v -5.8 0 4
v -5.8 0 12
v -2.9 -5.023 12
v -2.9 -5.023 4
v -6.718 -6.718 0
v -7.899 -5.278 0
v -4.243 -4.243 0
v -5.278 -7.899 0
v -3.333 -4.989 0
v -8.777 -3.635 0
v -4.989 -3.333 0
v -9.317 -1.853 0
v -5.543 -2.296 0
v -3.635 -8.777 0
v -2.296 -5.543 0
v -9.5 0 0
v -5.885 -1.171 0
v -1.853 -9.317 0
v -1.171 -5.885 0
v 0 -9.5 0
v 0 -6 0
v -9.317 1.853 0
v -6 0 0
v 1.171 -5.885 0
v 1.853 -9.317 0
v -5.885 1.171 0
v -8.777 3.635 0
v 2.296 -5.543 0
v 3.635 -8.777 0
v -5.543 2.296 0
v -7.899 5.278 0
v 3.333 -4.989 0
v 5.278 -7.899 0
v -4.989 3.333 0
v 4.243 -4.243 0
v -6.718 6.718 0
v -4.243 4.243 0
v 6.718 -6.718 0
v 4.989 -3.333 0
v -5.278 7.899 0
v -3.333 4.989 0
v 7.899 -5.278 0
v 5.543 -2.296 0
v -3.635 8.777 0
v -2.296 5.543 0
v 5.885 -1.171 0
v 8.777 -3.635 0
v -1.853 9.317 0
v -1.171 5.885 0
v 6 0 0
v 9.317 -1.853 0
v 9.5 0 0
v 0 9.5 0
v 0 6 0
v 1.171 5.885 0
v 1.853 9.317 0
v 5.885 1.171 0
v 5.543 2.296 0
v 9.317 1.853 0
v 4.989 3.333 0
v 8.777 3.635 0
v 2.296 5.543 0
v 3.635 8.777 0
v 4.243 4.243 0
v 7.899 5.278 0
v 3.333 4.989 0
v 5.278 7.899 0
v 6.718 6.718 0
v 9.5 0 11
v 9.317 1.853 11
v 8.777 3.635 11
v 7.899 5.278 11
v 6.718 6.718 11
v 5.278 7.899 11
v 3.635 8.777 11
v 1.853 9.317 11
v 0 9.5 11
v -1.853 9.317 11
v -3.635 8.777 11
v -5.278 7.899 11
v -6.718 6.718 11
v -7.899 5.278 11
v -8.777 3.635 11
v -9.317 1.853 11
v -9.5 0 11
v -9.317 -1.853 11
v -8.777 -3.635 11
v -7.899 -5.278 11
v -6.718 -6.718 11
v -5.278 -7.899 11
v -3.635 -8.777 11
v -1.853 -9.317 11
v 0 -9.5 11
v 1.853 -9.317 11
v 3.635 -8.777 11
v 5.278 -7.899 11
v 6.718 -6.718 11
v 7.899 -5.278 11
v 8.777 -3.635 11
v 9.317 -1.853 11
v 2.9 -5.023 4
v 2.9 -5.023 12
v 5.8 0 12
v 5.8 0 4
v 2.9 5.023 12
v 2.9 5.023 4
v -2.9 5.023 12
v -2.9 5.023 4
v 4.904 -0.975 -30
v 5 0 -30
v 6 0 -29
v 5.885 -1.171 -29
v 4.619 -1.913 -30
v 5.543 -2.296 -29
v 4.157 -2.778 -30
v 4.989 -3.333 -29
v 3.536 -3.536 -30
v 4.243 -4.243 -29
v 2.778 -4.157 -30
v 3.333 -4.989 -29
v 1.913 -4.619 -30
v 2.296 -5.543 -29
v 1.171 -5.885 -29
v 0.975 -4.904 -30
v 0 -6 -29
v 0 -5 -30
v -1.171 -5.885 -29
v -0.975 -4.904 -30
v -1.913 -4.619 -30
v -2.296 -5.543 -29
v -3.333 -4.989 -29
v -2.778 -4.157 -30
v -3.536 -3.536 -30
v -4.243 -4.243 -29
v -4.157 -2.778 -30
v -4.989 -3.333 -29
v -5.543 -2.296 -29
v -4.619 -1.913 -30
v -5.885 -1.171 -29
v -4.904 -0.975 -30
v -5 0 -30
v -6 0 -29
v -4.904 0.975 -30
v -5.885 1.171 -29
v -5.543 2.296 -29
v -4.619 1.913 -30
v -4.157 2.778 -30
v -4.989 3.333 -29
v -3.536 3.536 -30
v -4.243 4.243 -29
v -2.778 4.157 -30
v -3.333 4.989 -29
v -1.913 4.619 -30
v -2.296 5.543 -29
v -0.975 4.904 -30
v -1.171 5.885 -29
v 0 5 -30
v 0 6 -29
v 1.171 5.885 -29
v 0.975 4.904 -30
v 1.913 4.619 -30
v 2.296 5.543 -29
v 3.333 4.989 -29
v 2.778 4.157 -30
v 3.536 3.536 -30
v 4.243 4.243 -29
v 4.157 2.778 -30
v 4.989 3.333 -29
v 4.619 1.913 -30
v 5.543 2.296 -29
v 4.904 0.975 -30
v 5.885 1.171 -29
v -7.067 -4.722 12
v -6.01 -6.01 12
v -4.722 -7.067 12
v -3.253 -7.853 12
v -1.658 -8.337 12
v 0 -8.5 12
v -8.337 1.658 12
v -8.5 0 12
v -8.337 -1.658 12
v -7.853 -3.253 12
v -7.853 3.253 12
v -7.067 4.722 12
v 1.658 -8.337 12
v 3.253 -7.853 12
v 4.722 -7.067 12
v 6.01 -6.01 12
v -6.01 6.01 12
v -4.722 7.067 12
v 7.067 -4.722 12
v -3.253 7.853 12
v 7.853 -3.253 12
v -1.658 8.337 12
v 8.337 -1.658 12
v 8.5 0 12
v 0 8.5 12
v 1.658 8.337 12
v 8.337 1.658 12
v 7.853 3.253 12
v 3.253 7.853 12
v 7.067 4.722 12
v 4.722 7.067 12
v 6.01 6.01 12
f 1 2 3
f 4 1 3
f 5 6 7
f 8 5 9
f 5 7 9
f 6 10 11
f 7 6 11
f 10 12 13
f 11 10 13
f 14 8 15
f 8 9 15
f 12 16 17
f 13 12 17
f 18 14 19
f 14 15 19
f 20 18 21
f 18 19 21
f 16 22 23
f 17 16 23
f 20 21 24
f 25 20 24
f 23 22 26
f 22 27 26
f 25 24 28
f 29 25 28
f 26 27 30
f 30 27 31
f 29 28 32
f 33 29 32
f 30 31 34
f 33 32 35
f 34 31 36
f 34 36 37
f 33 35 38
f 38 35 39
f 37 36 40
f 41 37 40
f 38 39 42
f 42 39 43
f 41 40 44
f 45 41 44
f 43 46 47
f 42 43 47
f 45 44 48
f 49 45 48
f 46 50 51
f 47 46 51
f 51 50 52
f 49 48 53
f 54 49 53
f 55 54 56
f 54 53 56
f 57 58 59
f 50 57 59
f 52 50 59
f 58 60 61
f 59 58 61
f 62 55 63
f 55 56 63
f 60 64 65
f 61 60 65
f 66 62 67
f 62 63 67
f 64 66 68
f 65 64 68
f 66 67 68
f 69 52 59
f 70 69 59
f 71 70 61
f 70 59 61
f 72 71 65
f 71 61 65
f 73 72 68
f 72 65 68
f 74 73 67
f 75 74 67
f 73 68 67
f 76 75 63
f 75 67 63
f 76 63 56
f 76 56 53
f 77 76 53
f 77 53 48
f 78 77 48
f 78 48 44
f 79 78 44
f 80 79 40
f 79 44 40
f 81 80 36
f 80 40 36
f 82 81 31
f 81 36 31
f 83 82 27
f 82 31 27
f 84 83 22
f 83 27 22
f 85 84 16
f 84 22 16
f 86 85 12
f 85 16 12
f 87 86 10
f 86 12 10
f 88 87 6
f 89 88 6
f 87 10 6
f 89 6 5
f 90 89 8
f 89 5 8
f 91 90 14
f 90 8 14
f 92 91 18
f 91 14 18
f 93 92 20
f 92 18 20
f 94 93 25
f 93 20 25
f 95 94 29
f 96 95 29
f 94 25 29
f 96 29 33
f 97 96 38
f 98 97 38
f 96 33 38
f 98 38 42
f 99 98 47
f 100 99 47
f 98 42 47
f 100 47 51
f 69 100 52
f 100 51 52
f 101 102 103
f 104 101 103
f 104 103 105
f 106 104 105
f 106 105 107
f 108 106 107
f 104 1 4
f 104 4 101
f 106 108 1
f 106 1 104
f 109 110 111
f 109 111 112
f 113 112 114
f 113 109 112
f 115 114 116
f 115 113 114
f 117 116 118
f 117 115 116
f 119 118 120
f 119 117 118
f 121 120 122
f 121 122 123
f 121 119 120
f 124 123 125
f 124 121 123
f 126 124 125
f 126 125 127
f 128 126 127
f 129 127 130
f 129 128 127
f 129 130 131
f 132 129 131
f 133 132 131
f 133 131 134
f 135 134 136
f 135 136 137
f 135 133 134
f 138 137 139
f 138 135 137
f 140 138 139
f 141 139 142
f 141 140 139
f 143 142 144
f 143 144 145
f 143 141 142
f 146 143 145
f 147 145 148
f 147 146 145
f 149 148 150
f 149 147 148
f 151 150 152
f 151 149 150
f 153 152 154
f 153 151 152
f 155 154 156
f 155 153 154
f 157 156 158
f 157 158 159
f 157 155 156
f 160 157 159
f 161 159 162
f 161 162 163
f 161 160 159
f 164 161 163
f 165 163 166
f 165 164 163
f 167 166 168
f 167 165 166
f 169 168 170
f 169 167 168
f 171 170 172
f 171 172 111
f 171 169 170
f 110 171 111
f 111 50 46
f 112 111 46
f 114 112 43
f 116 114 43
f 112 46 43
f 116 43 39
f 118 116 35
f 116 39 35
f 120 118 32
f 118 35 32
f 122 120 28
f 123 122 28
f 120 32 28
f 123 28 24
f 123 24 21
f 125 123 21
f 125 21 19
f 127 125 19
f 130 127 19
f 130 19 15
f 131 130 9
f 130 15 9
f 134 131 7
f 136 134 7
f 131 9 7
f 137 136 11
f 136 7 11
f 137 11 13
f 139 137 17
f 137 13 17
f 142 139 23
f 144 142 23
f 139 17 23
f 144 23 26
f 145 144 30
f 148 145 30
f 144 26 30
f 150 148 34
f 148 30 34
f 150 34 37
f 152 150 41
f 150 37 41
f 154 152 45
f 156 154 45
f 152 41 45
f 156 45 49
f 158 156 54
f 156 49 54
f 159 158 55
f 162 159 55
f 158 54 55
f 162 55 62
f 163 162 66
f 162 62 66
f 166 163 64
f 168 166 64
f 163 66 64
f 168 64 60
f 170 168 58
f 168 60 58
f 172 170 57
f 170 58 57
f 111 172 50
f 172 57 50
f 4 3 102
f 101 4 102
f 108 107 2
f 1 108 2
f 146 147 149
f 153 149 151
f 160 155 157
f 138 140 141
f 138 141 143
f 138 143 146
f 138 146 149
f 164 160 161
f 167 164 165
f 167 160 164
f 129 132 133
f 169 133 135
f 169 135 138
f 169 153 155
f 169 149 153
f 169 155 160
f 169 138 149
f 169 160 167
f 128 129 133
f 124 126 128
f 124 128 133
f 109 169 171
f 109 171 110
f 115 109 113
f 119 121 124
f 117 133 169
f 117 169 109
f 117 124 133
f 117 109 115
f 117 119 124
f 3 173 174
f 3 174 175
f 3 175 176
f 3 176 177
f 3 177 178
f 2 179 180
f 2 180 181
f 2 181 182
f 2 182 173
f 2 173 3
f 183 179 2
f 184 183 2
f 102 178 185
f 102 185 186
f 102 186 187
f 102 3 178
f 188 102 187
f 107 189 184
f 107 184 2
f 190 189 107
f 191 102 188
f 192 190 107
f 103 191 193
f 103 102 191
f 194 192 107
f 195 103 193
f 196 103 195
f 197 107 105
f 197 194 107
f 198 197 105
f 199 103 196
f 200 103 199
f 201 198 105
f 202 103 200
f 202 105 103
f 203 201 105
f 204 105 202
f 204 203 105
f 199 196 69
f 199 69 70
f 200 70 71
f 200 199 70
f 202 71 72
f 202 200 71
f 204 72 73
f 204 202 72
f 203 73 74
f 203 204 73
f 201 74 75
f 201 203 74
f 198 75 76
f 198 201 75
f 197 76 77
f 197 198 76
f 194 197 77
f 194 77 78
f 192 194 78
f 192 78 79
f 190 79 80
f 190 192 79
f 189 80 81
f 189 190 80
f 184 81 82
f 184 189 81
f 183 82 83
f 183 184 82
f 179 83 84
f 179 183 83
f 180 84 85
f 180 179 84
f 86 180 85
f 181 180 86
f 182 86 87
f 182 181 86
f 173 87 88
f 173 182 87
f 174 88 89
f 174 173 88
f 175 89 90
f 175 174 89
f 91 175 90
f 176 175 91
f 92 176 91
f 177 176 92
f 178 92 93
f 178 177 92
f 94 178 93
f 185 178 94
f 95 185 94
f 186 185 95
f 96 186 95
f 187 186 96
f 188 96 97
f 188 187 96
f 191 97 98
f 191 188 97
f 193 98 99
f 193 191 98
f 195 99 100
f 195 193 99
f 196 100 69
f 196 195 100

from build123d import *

# Parameters (mm, degrees)
CROQUIS1_R              = 9.5
SALIENTE_EXTRUIR1_DEPTH = 12
CROQUIS2_R              = 6
SALIENTE_EXTRUIR2_DEPTH = 30
CHAFL_N1_SIZE           = 1
CORTAR_EXTRUIR1_DEPTH   = 8


with BuildPart() as part:
    # Croquis1 → Saliente-Extruir1 (new body)
    with BuildSketch(Plane.XY):
        Circle(CROQUIS1_R)
    extrude(amount=SALIENTE_EXTRUIR1_DEPTH)

    # Croquis2 → Saliente-Extruir2 (add)
    with BuildSketch(Plane(origin=(0, 0, 0), x_dir=(-1, 0, 0), z_dir=(0, 0, -1))):
        with Locations(Location((0, 0, 0), (0, 0, 180))):
            Circle(CROQUIS2_R)
    extrude(amount=SALIENTE_EXTRUIR2_DEPTH)

    # Chaflán1
    chafl_n1_edges = [part.edges().sort_by_distance(p)[0] for p in [
        (-9.5, 0, 12),
        (-6, 0, -30),
    ]]
    chamfer(chafl_n1_edges, length=CHAFL_N1_SIZE)

    # Croquis3 → Cortar-Extruir1 (cut)
    with BuildSketch(Plane.XY.offset(12)):
        Polygon((5.8, 0), (2.9, 5.022947342), (-2.9, 5.022947342), (-5.8, 0), (-2.9, -5.022947342), (2.9, -5.022947342), align=None)
    extrude(amount=-CORTAR_EXTRUIR1_DEPTH, mode=Mode.SUBTRACT)


solid = part.part
